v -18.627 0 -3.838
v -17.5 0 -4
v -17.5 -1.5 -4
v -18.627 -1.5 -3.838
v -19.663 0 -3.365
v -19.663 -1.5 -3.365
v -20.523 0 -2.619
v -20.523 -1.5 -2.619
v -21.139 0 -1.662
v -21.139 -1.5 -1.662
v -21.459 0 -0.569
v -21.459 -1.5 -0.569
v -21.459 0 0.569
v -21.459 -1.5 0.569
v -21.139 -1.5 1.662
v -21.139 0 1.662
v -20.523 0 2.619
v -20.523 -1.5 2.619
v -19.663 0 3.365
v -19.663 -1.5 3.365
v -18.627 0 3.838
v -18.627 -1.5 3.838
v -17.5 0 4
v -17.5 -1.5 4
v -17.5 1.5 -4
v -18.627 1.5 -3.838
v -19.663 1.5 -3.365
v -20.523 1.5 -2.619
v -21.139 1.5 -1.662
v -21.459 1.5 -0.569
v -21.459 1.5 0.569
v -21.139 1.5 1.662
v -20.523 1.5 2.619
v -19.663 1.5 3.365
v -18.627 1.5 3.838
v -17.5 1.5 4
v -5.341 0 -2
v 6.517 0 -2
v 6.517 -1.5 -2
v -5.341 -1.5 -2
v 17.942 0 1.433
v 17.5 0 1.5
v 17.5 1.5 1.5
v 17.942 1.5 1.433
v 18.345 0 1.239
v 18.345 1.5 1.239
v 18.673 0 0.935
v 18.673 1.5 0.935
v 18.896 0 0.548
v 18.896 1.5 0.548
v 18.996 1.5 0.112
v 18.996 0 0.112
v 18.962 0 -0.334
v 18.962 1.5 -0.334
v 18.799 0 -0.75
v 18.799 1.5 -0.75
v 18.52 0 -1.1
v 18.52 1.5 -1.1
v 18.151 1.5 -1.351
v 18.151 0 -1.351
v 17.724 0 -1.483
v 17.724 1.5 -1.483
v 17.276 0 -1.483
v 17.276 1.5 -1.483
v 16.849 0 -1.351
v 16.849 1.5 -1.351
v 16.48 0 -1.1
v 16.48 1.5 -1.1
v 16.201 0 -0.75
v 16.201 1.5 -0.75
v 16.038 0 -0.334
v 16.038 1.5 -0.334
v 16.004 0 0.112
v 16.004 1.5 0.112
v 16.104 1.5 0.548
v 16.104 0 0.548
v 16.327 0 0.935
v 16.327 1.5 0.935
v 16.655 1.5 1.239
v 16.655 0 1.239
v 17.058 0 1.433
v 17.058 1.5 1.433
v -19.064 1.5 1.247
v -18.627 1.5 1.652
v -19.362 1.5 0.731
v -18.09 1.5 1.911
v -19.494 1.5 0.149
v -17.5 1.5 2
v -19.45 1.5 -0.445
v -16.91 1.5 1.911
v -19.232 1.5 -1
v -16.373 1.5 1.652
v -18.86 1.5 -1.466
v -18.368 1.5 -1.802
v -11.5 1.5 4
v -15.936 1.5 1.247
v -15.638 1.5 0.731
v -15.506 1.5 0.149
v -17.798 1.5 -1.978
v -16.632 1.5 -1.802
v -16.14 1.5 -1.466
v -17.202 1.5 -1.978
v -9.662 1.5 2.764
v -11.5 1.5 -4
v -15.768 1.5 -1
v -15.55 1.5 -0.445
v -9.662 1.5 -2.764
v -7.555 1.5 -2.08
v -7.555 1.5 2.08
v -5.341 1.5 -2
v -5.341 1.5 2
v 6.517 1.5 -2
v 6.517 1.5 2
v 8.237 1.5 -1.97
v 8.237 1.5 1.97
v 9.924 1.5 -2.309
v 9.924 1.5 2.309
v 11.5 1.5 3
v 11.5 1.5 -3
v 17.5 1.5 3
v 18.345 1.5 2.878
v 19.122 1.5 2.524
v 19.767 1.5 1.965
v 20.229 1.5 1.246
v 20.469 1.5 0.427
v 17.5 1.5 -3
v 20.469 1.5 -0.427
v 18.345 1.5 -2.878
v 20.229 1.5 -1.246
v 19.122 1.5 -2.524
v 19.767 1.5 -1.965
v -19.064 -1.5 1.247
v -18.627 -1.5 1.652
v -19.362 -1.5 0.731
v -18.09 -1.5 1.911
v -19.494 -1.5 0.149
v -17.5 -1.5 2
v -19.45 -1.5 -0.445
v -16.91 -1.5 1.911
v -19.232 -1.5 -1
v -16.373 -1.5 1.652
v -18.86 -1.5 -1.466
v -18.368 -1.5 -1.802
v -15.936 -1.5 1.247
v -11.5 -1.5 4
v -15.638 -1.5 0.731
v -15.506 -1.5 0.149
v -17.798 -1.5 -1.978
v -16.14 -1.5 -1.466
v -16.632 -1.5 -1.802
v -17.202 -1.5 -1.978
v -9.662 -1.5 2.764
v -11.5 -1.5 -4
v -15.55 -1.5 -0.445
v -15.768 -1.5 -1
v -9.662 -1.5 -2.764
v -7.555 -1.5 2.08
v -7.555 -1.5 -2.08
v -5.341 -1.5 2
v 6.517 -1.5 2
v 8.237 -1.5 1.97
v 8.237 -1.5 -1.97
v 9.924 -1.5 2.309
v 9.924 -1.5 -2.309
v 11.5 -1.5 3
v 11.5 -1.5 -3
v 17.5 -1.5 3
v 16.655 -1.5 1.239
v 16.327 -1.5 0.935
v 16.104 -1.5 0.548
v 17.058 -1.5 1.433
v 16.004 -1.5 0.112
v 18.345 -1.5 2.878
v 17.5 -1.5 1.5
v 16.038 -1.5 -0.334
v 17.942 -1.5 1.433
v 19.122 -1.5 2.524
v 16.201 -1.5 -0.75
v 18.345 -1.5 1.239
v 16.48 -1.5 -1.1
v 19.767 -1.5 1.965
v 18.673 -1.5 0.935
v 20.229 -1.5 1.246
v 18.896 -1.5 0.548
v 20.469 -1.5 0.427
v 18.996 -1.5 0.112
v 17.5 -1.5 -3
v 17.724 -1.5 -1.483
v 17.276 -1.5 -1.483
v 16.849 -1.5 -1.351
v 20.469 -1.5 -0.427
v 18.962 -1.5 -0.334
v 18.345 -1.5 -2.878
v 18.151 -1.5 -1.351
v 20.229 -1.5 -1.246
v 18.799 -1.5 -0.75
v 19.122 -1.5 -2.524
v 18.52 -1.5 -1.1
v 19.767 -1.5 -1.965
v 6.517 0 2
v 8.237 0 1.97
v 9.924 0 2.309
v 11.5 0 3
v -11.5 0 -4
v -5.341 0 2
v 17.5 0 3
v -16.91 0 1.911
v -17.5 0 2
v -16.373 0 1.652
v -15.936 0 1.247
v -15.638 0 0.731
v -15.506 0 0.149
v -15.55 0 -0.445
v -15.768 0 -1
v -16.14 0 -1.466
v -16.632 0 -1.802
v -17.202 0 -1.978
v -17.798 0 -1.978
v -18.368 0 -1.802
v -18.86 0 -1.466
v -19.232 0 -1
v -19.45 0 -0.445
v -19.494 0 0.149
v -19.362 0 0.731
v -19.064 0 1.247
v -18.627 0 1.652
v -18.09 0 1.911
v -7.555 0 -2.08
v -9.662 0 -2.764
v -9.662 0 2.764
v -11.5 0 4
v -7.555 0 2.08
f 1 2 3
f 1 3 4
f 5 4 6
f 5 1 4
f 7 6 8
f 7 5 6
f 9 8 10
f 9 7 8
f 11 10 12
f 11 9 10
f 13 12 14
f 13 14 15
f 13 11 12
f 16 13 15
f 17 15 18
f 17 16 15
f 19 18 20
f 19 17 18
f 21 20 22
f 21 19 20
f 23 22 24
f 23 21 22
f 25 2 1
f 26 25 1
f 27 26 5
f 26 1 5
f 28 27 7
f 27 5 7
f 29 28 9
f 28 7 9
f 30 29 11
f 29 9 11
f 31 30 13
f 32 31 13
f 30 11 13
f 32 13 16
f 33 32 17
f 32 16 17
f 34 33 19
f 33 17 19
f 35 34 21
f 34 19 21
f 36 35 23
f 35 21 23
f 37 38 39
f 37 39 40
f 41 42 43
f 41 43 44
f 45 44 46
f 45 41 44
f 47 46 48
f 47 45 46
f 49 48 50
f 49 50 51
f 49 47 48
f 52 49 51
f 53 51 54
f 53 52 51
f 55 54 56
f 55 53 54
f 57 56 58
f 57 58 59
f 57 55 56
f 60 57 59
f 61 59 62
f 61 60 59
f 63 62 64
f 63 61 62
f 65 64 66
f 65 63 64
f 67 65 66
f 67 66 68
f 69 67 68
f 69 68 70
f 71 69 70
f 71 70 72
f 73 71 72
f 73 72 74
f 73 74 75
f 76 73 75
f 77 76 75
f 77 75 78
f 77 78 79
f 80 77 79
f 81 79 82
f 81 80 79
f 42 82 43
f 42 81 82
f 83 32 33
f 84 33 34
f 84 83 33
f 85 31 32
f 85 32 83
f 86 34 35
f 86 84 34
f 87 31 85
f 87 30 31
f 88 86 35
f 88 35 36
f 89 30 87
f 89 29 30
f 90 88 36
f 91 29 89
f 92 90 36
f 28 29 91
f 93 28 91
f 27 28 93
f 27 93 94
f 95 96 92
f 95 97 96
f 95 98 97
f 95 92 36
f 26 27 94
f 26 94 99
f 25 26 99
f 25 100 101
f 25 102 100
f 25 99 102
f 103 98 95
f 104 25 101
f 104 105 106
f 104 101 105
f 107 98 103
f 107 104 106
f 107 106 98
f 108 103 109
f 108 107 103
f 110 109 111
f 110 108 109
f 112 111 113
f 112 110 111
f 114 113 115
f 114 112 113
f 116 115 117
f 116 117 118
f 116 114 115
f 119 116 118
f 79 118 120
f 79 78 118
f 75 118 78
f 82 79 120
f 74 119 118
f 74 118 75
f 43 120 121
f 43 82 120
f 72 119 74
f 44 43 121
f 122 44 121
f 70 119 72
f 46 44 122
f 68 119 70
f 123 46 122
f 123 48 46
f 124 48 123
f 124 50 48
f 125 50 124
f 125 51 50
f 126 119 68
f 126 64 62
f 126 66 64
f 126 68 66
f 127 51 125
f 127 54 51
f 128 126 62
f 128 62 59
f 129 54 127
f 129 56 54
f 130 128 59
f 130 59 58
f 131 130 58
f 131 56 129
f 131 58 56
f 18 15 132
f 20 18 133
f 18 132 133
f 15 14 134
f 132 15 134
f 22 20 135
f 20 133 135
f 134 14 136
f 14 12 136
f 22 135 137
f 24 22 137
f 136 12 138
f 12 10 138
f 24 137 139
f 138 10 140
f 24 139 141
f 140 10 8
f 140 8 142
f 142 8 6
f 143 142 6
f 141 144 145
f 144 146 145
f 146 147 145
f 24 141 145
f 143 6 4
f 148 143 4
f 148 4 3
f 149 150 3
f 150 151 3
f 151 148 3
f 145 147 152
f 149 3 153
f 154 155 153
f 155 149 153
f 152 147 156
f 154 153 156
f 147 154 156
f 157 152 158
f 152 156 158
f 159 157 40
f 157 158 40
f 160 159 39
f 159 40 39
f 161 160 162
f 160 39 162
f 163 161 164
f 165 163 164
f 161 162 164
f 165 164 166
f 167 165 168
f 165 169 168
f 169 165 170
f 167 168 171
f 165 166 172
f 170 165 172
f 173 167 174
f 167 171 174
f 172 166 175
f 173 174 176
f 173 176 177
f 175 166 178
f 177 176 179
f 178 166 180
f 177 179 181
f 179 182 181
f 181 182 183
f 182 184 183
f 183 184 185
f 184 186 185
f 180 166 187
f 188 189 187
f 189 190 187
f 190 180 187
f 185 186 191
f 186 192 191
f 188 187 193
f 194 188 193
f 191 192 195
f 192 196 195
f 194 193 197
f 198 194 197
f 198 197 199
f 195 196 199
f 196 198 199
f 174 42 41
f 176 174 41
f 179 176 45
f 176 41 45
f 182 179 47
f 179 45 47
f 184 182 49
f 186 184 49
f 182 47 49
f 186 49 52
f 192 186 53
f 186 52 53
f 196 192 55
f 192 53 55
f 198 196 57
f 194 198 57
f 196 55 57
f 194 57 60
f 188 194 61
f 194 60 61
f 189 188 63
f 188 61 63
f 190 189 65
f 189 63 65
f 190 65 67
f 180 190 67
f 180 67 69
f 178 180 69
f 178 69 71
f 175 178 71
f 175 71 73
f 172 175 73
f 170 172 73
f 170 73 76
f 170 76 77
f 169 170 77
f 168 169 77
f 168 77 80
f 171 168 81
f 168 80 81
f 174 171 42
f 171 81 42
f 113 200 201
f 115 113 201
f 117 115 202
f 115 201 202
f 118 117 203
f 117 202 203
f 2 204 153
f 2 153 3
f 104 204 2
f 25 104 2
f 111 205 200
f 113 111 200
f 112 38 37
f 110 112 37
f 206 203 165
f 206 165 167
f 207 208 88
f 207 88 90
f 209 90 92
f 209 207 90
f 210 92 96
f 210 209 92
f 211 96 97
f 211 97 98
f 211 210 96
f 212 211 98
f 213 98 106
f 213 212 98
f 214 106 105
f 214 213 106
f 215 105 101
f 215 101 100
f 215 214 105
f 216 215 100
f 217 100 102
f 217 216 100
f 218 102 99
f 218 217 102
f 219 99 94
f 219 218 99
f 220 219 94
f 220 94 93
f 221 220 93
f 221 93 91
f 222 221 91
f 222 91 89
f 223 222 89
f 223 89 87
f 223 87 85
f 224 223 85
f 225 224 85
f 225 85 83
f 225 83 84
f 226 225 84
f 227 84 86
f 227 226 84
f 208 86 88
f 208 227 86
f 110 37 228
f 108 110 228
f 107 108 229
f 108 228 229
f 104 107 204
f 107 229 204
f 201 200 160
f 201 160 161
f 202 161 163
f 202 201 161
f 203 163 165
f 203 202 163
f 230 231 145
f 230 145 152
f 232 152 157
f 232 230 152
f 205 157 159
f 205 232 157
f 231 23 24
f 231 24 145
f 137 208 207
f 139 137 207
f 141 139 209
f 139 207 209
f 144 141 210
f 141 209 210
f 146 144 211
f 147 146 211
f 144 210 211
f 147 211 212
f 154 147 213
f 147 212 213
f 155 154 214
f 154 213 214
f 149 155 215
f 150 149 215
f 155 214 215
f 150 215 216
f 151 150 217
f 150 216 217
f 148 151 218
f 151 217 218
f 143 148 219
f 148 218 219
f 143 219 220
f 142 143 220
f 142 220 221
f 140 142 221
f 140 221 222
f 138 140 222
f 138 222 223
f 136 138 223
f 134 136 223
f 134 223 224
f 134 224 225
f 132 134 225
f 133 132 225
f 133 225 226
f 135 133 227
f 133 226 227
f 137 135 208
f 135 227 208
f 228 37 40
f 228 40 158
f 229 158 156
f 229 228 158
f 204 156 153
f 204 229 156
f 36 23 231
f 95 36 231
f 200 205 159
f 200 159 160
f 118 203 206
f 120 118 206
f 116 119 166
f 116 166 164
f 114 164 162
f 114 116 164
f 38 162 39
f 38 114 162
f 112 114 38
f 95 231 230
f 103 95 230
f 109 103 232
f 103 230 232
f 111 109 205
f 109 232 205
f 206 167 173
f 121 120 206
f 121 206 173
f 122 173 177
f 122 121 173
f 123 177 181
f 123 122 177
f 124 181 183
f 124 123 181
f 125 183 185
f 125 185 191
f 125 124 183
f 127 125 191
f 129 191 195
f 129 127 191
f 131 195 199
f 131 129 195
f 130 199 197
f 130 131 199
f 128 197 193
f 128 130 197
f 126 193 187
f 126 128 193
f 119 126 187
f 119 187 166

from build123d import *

# Parameters (mm, degrees)
SKETCH1_R           = 4
SKETCH1_R_2         = 2
SKETCH1_R_3         = 3
SKETCH1_R_4         = 1.5
BOSS_EXTRUDE1_DEPTH = 1.5


with BuildPart() as part:
    # Sketch1 → Boss-Extrude1 (new, symmetric)
    # profile 1 of 3: a face of its own
    with BuildSketch(Plane(origin=(0, 0, 0), x_dir=(1, 0, 0), z_dir=(0, 1, 0))):
        with BuildLine():
            Line((-11.5, 4), (-17.5, 4))
            ThreePointArc((-17.5, 4), (-14.671572875, 2.828427125), (-13.5, 0))
            ThreePointArc((-13.5, 0), (-14.671572875, -2.828427125), (-17.5, -4))
            Line((-17.5, -4), (-11.5, -4))
            ThreePointArc((-11.5, -4), (-8.632069519, -2.34904785), (-5.341350168, -2))
            Line((-5.341350168, -2), (6.516979908, -2))
            ThreePointArc((6.516979908, -2), (9.090013088, -2.093768583), (11.5, -3))
            Line((11.5, -3), (17.5, -3))
            ThreePointArc((17.5, -3), (14.5, 0), (17.5, 3))
            Line((17.5, 3), (11.5, 3))
            ThreePointArc((11.5, 3), (9.090013088, 2.093768583), (6.516979908, 2))
            Line((6.516979908, 2), (-5.341350168, 2))
            ThreePointArc((-5.341350168, 2), (-8.632069519, 2.34904785), (-11.5, 4))
        make_face()
    # profile 2 of 3: a face of its own
    with BuildSketch(Plane(origin=(0, 0, 0), x_dir=(1, 0, 0), z_dir=(0, 1, 0))):
        with Locations((-17.5, 0)):
            Circle(SKETCH1_R)
        with Locations(Location((-17.5, 0, 0), (0, 0, 270))):
            Circle(SKETCH1_R_2, mode=Mode.SUBTRACT)
    # profile 3 of 3: a face of its own
    with BuildSketch(Plane(origin=(0, 0, 0), x_dir=(1, 0, 0), z_dir=(0, 1, 0))):
        with Locations((17.5, 0)):
            Circle(SKETCH1_R_3)
        with Locations(Location((17.5, 0, 0), (0, 0, 270))):
            Circle(SKETCH1_R_4, mode=Mode.SUBTRACT)
    extrude(amount=BOSS_EXTRUDE1_DEPTH, both=True)


solid = part.part
